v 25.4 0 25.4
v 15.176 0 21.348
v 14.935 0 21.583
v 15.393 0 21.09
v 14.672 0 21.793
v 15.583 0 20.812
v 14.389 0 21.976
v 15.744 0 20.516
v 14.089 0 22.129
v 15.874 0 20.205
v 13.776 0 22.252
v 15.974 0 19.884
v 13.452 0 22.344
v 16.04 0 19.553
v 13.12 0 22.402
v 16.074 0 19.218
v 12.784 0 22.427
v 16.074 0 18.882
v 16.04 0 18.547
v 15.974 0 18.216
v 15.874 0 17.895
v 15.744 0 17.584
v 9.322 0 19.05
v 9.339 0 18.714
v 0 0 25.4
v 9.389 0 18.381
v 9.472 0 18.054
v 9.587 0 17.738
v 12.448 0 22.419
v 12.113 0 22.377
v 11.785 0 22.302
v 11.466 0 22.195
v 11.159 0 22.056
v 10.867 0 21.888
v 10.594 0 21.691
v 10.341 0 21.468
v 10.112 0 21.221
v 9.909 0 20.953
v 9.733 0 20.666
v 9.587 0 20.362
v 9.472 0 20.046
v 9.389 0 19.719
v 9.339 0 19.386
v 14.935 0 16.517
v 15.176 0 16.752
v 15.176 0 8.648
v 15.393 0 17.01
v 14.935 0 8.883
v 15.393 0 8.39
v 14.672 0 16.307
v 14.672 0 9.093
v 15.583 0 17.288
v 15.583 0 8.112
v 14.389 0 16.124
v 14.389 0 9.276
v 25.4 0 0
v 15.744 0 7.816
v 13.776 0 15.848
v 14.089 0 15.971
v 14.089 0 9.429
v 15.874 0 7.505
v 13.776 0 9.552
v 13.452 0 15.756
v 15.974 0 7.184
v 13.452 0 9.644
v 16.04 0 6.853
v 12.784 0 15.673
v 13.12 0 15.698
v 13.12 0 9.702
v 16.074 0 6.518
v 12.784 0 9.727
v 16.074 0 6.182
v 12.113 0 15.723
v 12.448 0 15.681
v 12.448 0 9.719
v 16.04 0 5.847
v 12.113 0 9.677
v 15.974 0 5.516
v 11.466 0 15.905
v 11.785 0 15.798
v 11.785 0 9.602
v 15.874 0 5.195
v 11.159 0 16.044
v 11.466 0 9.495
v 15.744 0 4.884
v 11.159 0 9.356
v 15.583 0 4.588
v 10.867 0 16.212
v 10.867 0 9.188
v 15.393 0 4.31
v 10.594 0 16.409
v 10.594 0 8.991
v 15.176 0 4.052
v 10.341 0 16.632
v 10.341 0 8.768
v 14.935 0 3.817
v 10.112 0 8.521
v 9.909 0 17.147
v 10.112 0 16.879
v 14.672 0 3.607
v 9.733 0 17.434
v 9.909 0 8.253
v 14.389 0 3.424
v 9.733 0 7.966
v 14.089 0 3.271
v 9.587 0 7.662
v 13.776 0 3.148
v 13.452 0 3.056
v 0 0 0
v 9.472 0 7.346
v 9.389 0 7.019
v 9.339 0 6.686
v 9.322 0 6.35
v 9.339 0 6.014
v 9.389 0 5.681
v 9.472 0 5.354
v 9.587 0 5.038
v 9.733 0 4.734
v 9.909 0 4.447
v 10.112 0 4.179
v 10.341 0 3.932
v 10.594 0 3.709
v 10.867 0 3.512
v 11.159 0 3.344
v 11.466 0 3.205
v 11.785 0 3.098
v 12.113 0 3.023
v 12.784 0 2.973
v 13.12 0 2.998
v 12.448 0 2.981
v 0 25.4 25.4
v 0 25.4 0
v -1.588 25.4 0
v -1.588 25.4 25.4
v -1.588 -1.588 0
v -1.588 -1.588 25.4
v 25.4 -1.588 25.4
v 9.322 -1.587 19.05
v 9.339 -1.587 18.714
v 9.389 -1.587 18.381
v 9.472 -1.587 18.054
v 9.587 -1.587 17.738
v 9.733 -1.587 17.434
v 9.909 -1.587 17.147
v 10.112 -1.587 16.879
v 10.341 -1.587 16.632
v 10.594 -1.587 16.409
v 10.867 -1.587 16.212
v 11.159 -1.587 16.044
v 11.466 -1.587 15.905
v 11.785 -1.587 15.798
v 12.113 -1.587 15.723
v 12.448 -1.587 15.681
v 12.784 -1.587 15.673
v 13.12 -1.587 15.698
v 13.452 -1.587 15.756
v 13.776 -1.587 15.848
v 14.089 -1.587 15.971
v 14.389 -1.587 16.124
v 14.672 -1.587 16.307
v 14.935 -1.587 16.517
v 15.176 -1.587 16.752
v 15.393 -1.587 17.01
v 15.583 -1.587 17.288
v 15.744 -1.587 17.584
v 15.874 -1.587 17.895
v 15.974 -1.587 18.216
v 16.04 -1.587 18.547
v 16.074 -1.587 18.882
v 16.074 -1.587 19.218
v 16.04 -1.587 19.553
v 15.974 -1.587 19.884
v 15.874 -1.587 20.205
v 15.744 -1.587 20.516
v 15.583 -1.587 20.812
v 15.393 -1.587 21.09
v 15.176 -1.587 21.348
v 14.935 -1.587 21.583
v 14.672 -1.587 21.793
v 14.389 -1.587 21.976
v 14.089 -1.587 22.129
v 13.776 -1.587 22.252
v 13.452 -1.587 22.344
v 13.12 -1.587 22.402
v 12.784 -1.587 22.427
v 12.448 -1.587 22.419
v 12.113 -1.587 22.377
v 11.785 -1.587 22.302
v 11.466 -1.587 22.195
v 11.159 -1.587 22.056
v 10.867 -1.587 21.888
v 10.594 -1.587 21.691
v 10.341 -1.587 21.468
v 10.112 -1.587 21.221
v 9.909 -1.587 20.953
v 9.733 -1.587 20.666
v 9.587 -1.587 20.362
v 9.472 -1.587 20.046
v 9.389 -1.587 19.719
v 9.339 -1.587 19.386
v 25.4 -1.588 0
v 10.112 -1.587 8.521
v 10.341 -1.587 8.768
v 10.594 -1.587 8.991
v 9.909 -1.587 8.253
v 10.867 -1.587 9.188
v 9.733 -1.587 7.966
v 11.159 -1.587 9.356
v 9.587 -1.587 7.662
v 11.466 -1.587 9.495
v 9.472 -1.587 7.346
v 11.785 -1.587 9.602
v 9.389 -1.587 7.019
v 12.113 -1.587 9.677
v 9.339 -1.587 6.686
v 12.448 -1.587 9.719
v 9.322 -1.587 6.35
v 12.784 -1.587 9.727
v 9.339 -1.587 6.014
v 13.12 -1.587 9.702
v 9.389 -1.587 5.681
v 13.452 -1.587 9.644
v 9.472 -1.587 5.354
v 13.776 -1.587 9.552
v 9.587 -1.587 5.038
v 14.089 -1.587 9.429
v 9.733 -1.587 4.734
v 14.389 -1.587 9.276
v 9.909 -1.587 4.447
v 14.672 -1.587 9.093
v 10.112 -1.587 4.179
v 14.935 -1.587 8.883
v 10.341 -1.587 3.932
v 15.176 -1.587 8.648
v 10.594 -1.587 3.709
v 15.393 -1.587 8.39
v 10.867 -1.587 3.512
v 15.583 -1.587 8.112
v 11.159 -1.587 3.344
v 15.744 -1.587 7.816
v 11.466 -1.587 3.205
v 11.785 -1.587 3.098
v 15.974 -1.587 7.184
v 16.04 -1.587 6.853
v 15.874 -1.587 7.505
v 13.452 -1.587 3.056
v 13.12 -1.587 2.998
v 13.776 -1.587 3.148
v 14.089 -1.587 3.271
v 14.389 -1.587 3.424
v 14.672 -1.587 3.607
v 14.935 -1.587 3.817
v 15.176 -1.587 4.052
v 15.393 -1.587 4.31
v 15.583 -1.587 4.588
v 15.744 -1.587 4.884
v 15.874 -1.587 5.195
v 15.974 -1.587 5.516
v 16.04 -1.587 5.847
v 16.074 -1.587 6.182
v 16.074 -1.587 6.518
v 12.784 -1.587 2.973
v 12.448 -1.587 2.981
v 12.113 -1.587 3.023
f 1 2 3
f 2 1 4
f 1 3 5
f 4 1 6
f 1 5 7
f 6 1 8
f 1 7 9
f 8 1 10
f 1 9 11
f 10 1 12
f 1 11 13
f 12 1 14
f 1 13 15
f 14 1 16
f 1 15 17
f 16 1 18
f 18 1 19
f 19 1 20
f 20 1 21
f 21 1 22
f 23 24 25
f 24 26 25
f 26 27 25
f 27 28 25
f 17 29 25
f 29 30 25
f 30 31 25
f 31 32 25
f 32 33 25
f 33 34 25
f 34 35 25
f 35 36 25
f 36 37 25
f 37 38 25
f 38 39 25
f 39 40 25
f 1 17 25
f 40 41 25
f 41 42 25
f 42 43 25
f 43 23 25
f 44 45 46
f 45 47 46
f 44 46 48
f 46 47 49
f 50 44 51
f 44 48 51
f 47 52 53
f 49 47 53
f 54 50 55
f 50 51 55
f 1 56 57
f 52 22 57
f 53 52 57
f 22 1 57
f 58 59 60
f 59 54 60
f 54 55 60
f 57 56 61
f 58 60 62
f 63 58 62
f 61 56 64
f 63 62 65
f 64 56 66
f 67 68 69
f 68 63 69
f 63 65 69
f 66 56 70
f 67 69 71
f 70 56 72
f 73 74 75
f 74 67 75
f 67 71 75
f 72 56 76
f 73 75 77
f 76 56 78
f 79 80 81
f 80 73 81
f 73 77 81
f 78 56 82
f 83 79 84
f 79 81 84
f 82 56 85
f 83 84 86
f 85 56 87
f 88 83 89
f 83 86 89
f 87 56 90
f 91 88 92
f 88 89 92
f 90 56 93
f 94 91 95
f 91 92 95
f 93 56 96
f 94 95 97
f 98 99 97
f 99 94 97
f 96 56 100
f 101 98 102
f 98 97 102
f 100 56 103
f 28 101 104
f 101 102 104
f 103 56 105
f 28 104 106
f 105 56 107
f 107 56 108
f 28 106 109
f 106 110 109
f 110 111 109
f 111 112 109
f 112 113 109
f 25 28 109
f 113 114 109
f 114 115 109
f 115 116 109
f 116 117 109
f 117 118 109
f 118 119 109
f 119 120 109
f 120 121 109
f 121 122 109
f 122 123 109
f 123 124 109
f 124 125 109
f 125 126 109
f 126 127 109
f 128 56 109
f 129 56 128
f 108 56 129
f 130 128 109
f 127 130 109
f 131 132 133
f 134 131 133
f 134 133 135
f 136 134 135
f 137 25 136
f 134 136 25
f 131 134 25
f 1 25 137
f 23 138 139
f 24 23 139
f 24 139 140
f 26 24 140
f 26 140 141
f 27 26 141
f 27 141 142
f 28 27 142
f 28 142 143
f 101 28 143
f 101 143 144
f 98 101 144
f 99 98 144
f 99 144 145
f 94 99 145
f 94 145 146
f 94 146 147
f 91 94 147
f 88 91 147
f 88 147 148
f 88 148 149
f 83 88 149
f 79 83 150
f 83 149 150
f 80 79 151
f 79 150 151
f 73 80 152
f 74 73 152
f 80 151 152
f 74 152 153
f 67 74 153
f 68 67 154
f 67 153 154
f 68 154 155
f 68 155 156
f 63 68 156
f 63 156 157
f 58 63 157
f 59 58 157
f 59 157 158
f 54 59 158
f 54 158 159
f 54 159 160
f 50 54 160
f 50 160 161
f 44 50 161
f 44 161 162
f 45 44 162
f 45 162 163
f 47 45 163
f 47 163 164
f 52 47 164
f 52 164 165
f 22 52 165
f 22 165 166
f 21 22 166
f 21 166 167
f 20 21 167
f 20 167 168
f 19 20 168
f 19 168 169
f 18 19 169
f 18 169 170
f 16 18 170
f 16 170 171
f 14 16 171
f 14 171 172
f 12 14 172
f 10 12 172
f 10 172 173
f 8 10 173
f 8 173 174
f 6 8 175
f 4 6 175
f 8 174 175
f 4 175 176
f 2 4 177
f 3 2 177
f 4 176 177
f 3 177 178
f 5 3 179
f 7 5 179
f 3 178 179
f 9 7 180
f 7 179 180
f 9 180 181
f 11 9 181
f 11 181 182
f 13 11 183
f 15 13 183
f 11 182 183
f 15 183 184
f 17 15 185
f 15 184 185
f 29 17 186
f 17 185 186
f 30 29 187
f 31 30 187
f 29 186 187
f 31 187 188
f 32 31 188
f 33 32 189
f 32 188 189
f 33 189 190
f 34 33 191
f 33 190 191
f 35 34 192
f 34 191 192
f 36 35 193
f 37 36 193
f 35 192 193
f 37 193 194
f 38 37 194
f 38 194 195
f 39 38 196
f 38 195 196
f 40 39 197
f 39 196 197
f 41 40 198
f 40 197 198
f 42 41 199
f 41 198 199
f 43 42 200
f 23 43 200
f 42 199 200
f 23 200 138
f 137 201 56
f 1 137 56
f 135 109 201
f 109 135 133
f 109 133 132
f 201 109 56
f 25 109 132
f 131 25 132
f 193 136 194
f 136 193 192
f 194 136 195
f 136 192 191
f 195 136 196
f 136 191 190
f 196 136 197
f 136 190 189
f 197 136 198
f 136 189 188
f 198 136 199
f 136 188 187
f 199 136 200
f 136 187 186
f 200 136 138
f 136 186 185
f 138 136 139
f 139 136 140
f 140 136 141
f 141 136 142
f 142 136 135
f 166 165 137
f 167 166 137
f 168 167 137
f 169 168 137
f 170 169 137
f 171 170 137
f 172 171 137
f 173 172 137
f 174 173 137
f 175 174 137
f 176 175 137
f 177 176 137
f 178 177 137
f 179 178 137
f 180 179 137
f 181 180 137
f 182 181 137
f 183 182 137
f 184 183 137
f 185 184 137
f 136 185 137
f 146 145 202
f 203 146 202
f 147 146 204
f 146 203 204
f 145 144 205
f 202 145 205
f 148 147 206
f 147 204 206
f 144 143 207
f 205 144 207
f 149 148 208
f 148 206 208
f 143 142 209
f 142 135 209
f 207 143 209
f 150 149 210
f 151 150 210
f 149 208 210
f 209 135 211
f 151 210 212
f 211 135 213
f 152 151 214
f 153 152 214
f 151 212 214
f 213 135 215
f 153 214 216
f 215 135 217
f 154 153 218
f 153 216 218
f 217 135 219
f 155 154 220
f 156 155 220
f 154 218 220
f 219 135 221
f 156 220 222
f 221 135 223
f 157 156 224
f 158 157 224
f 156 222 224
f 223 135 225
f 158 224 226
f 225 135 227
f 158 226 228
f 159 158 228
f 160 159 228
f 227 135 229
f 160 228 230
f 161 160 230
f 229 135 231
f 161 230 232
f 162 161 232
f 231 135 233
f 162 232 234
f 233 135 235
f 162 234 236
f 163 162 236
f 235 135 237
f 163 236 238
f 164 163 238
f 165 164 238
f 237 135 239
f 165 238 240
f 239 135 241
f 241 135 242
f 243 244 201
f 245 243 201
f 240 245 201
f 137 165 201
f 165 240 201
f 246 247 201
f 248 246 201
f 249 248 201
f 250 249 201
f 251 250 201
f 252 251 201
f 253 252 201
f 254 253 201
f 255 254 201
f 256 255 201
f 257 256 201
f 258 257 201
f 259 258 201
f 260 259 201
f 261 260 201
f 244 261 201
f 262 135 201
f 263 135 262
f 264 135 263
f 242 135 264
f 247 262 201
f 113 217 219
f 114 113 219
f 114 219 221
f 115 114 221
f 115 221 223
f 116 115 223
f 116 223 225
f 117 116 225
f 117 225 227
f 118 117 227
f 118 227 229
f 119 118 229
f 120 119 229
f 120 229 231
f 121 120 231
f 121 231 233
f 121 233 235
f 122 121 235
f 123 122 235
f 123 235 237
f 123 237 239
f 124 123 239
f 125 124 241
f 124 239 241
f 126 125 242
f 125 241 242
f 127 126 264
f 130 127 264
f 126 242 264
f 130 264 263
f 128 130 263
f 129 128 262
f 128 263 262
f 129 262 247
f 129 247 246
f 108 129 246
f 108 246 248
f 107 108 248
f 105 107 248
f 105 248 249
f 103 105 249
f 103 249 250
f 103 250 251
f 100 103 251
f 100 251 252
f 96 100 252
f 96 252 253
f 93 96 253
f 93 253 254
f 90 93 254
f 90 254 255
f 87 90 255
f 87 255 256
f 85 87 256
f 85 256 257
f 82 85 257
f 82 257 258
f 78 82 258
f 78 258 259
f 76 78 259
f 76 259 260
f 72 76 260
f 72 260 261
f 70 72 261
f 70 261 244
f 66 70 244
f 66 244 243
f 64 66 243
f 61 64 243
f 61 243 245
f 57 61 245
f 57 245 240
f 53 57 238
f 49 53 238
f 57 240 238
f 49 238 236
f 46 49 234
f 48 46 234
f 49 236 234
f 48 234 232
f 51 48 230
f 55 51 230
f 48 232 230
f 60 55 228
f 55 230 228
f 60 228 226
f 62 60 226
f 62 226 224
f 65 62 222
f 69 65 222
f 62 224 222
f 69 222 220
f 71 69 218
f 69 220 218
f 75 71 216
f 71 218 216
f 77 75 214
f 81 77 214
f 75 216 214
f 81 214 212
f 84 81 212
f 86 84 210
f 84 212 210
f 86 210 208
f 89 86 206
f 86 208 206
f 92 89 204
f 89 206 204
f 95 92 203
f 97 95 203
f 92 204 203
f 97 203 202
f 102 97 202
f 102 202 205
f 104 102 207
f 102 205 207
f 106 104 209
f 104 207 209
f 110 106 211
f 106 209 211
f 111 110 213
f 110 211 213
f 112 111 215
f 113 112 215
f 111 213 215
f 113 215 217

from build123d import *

# Parameters (mm, degrees)
BOSS_EXTRUDE1_DEPTH     = 25.4
F_1_4_CLEARANCE_HOLE1_D = 6.7564


with BuildPart() as part:
    # Sketch1 → Boss-Extrude1 (new body)
    with BuildSketch(Plane.XY):
        Polygon((0, 0), (0, 25.4), (-1.5875, 25.4), (-1.5875, -1.5875), (25.4, -1.5875), (25.4, 0), align=None)
    extrude(amount=BOSS_EXTRUDE1_DEPTH)

    # 1/4 Clearance Hole1 (through all)
    with Locations(Plane(origin=(12.7, 0, 19.05), x_dir=(1, 0, 0), z_dir=(0, 1, 0))):
        with Locations((0, 0), (0, 12.7)):
            Hole(F_1_4_CLEARANCE_HOLE1_D / 2)


solid = part.part
